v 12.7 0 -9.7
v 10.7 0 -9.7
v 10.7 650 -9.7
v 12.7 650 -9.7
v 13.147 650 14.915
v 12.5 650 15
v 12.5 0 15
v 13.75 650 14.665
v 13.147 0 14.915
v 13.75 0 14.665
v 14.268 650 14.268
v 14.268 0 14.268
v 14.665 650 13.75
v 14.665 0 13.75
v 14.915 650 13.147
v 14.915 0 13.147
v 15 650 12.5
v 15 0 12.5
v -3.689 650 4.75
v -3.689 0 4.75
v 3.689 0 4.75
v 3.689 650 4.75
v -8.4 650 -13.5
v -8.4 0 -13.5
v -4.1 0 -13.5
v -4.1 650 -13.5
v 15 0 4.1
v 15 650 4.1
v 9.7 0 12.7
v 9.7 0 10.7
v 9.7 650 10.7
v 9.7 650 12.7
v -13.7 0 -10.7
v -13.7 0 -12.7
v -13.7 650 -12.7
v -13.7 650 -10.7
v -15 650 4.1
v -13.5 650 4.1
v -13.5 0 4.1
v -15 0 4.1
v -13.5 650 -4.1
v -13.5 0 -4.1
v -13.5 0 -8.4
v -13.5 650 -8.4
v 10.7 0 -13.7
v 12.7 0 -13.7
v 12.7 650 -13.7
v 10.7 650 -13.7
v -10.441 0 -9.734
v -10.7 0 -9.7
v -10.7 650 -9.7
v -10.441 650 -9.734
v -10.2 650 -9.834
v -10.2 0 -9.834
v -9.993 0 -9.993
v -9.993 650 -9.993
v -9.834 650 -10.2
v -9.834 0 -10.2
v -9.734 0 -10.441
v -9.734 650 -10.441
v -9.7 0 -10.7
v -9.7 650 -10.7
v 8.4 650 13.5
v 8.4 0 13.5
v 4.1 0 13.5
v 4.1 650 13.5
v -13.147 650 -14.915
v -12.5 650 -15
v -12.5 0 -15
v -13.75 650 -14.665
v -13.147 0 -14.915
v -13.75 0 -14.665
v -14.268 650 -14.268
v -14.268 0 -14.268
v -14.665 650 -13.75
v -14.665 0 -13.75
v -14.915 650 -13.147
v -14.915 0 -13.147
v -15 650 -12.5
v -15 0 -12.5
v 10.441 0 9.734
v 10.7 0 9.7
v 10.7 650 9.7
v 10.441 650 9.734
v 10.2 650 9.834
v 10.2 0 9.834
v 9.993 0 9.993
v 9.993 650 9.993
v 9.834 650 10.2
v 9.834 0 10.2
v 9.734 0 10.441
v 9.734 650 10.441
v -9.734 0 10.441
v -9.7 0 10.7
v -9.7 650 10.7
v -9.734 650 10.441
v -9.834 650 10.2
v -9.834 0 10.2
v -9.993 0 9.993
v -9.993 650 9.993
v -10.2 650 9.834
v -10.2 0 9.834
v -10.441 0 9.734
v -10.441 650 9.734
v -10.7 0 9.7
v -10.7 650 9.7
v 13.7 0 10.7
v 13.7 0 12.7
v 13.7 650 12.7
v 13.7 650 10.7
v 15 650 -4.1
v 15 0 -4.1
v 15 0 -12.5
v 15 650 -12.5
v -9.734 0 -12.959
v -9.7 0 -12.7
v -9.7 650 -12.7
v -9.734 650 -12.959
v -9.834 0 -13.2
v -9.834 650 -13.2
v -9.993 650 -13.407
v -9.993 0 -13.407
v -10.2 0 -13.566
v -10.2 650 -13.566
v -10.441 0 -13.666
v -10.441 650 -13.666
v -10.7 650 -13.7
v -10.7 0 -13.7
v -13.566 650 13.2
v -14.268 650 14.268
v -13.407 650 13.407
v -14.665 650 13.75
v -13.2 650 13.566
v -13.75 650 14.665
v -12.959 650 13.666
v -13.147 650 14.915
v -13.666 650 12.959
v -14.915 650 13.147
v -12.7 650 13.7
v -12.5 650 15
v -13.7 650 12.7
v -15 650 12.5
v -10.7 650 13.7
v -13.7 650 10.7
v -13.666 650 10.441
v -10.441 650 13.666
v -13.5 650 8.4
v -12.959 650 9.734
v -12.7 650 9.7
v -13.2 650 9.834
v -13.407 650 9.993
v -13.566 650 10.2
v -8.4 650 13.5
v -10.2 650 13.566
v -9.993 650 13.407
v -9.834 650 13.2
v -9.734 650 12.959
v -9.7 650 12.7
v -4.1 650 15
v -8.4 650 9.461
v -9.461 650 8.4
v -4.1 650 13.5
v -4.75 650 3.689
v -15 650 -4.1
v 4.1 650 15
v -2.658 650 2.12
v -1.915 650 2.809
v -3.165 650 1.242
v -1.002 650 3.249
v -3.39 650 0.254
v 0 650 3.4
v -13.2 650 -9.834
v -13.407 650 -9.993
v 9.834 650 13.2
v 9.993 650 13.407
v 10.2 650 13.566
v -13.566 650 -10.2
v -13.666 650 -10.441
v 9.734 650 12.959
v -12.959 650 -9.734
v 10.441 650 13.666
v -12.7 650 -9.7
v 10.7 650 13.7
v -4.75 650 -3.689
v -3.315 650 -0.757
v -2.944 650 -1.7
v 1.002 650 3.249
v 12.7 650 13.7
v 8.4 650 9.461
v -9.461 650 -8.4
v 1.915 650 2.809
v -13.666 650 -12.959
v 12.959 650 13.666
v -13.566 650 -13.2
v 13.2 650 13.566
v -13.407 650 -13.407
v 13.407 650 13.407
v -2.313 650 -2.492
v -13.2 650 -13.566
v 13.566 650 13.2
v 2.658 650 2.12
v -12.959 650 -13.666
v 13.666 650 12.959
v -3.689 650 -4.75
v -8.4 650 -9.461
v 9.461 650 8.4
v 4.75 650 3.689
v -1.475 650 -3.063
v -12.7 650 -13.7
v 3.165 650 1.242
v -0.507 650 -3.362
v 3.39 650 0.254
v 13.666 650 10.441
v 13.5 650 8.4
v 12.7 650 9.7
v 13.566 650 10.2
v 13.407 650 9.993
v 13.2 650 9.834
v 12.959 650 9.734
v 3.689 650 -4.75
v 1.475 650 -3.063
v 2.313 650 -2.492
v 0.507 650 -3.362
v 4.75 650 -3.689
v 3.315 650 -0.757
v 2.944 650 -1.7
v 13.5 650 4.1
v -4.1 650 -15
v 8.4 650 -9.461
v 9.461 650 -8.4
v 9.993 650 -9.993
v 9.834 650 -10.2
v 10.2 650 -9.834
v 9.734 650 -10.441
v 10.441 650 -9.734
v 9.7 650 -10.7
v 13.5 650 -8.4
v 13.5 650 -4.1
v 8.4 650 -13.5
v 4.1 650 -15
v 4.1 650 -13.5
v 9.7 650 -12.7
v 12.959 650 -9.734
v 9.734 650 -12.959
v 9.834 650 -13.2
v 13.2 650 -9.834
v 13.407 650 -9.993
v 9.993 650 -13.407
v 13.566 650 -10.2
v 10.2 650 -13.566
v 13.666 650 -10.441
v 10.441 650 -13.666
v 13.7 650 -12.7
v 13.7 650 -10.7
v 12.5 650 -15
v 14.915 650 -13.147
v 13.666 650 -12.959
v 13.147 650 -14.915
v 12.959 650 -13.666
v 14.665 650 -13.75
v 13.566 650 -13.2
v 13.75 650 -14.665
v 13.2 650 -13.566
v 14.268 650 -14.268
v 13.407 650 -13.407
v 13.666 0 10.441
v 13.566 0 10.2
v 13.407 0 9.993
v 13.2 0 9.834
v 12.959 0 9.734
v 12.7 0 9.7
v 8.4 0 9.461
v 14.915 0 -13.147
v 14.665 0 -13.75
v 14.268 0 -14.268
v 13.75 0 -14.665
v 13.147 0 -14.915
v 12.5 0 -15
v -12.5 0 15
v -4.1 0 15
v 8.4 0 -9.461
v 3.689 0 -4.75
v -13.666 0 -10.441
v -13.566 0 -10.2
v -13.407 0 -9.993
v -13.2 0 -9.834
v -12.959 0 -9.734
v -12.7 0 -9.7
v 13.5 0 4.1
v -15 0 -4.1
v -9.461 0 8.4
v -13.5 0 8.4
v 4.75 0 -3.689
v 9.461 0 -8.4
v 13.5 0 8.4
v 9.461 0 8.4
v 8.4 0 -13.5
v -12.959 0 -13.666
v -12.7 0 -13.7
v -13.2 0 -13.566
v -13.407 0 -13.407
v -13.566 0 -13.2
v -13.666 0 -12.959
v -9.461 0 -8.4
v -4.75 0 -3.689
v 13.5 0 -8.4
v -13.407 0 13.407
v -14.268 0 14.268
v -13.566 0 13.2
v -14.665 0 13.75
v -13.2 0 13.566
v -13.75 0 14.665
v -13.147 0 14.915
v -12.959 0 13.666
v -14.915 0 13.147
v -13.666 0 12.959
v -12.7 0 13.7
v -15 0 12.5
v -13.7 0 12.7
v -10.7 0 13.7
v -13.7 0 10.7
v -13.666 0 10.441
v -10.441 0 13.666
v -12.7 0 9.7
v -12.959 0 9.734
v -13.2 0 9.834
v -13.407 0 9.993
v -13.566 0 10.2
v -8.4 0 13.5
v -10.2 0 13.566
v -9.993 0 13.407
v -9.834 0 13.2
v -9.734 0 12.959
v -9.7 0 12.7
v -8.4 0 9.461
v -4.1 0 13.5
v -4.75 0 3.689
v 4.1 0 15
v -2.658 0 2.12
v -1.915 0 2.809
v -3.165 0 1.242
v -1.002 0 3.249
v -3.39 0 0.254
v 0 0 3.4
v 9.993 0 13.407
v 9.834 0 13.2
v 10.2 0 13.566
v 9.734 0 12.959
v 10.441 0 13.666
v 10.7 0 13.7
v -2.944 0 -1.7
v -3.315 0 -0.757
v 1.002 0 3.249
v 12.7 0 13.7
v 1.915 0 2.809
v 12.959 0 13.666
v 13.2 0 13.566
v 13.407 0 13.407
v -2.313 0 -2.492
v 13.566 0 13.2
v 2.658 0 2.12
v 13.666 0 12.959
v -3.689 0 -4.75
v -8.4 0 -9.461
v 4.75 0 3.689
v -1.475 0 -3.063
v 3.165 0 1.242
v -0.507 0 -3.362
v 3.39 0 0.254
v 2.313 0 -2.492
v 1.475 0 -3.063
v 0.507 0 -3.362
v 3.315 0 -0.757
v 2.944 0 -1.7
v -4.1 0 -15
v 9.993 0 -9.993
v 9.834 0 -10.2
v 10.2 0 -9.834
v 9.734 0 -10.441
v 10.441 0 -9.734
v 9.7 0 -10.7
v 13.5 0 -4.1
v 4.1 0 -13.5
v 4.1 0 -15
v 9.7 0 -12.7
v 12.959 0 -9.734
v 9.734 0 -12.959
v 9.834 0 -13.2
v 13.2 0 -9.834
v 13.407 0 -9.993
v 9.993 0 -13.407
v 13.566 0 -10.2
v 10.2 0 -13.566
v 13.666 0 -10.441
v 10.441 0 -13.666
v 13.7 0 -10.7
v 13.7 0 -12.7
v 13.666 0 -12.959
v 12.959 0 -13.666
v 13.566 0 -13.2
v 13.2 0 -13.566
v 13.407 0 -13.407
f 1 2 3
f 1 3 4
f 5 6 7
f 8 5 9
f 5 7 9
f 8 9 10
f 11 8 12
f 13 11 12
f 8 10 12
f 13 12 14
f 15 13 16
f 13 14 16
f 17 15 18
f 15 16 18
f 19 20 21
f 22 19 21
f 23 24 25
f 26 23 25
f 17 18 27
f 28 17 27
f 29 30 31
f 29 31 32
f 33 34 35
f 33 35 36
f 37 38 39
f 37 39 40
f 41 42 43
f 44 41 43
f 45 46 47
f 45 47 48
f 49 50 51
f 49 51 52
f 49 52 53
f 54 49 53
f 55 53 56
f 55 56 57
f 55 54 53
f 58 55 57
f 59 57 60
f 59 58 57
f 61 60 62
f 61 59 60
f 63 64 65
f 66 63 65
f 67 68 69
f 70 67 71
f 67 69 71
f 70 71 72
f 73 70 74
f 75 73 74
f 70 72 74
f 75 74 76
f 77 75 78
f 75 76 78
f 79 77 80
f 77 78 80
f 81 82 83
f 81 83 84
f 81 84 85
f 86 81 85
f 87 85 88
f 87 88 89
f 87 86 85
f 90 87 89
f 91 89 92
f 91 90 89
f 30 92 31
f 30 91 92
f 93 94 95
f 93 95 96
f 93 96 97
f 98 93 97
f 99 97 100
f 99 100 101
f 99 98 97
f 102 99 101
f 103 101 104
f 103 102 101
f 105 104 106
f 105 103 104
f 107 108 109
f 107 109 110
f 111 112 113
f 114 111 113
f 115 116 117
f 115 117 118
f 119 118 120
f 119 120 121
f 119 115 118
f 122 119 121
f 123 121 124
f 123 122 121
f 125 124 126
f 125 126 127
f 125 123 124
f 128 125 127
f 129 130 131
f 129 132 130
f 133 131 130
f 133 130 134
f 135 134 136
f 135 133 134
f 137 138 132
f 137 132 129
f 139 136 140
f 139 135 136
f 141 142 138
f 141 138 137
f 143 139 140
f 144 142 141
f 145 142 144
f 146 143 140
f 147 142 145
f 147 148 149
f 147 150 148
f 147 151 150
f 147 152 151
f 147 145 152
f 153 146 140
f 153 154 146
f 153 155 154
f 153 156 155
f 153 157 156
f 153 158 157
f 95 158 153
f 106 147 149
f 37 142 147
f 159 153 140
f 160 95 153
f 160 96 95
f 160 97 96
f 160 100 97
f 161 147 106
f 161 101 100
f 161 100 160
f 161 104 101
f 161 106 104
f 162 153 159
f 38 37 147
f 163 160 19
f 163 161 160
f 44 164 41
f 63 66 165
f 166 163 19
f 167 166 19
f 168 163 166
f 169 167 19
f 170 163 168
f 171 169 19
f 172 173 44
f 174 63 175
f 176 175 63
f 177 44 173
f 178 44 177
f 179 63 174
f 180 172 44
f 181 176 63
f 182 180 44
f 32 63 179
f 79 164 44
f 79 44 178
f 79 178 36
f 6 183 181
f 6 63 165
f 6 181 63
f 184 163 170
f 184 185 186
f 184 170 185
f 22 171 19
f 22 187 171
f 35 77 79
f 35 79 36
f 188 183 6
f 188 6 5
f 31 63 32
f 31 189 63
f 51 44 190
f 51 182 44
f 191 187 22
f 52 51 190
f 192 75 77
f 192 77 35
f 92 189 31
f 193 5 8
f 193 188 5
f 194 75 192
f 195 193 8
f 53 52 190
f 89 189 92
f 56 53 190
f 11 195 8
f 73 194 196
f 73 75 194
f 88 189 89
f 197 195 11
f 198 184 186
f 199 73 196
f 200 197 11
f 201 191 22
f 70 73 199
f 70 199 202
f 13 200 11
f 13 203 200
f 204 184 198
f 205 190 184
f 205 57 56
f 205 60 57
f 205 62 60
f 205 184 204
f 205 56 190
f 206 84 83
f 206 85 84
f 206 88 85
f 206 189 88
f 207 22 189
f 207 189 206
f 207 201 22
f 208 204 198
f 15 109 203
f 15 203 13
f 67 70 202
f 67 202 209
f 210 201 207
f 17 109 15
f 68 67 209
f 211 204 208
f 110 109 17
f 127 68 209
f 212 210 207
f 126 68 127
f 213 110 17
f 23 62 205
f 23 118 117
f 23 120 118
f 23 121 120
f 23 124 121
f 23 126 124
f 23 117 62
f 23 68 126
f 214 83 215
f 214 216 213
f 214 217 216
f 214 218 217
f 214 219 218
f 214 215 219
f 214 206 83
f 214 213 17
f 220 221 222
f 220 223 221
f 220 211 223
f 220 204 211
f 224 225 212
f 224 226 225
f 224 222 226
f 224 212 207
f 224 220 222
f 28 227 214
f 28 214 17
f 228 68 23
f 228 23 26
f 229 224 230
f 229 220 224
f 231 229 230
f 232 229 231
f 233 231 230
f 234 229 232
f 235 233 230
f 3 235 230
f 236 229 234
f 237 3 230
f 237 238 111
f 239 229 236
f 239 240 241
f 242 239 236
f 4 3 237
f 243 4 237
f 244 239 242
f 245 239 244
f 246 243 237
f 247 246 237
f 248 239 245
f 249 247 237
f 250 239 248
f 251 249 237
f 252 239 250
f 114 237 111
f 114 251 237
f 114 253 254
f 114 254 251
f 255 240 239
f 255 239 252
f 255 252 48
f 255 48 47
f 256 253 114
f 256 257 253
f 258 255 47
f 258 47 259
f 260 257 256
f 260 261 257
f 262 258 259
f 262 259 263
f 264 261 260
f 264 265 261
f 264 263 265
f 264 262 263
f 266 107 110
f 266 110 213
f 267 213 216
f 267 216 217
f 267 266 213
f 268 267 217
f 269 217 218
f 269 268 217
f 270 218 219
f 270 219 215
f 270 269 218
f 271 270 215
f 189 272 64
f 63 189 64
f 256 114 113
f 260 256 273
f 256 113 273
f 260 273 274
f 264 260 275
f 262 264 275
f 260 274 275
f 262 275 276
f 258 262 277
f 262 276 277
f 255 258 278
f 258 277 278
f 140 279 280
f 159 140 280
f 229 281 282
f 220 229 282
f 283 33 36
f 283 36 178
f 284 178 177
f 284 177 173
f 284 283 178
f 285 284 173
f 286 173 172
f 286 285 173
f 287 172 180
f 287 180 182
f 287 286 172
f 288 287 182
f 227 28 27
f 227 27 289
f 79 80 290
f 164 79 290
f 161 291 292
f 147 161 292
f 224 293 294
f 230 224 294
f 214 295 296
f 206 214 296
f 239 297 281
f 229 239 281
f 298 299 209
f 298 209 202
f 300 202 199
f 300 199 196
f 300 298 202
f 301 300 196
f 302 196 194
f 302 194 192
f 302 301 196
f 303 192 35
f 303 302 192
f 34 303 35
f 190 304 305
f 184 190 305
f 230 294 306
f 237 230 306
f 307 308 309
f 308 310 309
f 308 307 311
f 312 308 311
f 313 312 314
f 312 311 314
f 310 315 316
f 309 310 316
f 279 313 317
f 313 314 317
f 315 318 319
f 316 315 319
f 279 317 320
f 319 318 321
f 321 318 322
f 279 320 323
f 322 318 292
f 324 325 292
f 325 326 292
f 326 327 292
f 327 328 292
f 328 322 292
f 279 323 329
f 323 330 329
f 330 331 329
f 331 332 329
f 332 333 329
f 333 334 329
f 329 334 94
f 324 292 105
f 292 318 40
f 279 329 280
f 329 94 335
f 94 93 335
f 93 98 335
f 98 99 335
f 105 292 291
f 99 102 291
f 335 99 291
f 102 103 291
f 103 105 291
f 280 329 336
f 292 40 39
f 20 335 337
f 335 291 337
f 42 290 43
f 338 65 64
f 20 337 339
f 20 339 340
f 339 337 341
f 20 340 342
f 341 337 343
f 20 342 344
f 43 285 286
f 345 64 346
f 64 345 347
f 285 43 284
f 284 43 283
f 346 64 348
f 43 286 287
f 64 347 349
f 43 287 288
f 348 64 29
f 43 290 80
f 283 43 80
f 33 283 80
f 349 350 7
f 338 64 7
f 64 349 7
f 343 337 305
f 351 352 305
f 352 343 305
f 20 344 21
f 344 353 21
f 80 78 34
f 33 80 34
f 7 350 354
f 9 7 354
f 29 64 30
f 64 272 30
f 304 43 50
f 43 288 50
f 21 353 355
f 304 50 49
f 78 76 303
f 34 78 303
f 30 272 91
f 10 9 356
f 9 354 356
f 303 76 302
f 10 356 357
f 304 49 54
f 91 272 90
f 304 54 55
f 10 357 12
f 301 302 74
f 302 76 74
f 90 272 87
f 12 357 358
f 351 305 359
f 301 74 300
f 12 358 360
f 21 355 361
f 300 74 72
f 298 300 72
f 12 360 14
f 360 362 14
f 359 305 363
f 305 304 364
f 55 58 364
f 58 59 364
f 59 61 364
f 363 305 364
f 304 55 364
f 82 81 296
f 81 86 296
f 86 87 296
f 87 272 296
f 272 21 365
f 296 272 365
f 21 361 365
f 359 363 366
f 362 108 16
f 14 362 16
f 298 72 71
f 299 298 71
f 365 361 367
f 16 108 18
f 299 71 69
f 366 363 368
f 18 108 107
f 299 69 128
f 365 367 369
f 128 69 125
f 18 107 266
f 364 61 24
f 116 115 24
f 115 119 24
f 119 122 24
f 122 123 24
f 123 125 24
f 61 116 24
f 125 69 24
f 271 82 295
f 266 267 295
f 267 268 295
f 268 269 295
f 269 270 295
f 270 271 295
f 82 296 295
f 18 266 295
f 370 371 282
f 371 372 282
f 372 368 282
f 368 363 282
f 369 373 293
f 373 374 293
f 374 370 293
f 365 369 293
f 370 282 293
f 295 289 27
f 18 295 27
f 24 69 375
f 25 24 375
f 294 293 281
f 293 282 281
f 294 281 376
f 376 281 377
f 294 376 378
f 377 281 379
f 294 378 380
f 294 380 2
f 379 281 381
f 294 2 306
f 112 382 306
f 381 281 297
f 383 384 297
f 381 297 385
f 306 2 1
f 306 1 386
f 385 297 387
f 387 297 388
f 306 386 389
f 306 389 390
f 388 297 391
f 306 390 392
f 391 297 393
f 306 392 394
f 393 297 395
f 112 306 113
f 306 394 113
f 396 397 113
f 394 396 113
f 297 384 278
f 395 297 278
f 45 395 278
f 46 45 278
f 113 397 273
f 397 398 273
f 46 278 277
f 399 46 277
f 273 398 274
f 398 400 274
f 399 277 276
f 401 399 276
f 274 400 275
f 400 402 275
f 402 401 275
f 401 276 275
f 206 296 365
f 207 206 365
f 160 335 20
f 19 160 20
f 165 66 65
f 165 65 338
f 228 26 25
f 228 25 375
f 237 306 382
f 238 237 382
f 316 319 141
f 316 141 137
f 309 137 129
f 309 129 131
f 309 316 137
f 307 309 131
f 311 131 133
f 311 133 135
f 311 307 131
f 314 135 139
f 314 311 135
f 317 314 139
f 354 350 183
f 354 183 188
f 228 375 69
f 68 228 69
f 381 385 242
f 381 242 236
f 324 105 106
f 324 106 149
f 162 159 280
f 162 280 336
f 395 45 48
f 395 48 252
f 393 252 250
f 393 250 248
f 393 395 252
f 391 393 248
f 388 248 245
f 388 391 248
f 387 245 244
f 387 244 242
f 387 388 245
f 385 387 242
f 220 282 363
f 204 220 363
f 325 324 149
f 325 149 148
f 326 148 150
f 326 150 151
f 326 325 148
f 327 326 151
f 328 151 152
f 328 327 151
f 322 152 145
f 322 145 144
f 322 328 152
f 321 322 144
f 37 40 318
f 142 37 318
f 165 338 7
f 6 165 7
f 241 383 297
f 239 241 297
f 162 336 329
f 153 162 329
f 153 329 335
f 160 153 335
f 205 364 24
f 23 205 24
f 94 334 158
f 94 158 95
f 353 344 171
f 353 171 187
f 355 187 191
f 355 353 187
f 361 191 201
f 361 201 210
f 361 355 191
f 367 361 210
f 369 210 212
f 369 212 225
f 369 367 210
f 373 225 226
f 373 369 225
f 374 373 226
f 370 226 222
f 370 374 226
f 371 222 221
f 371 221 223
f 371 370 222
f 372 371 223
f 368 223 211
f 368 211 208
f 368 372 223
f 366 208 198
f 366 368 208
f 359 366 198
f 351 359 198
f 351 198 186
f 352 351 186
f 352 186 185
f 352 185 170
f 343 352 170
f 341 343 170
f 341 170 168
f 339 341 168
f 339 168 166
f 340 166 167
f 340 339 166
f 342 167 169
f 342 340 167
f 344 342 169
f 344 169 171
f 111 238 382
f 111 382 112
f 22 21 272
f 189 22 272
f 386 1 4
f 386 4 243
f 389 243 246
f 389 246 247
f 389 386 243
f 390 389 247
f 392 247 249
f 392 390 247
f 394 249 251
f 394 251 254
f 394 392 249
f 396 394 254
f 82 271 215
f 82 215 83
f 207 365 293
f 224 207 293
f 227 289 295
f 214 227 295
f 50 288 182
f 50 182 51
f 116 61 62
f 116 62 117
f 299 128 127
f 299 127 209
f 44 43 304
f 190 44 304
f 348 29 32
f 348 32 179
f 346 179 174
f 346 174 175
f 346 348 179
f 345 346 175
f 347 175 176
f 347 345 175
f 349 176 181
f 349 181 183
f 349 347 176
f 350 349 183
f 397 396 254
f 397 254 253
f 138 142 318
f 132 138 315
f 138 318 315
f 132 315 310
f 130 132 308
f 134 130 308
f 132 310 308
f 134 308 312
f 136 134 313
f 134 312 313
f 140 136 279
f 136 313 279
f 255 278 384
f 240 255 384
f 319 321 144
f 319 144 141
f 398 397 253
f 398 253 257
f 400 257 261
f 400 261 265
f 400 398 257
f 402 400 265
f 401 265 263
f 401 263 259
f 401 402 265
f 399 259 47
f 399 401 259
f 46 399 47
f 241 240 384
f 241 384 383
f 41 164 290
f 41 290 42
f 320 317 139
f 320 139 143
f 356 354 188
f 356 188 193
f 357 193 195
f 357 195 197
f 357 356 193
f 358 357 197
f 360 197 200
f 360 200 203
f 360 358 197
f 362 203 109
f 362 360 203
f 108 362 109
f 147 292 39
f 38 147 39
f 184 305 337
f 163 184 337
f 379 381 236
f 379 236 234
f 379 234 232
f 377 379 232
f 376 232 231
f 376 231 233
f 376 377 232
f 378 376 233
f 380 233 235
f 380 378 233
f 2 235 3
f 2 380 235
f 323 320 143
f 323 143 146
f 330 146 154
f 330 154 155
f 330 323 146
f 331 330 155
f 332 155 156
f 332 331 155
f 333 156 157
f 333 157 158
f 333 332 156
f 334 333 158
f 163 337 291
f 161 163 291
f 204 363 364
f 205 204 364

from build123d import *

# Parameters (mm, degrees)
SKETCH_1_R      = 3.4
EXTRUDE_1_DEPTH = 650


with BuildPart() as part:
    # 草图1 → 凸台-拉伸1 (new body)
    with BuildSketch(Plane(origin=(0, 0, 0), x_dir=(1, 0, 0), z_dir=(0, 1, 0))):
        with BuildLine():
            Line((-4.1, 15), (-12.5, 15))
            ThreePointArc((-12.5, 15), (-14.267766953, 14.267766953), (-15, 12.5))
            Line((-15, 12.5), (-15, 4.1))
            Line((-15, 4.1), (-13.5, 4.1))
            Line((-13.5, 4.1), (-13.5, 8.4))
            Line((-13.5, 8.4), (-9.460660172, 8.4))
            Line((-9.460660172, 8.4), (-4.75, 3.689339828))
            Line((-4.75, 3.689339828), (-4.75, -3.689339828))
            Line((-4.75, -3.689339828), (-9.460660172, -8.4))
            Line((-9.460660172, -8.4), (-13.5, -8.4))
            Line((-13.5, -8.4), (-13.5, -4.1))
            Line((-13.5, -4.1), (-15, -4.1))
            Line((-15, -4.1), (-15, -12.5))
            ThreePointArc((-15, -12.5), (-14.267766953, -14.267766953), (-12.5, -15))
            Line((-12.5, -15), (-4.1, -15))
            Line((-4.1, -15), (-4.1, -13.5))
            Line((-4.1, -13.5), (-8.4, -13.5))
            Line((-8.4, -13.5), (-8.4, -9.460660172))
            Line((-8.4, -9.460660172), (-3.689339828, -4.75))
            Line((-3.689339828, -4.75), (3.689339828, -4.75))
            Line((3.689339828, -4.75), (8.4, -9.460660172))
            Line((8.4, -9.460660172), (8.4, -13.5))
            Line((8.4, -13.5), (4.1, -13.5))
            Line((4.1, -13.5), (4.1, -15))
            Line((4.1, -15), (12.5, -15))
            ThreePointArc((12.5, -15), (14.267766953, -14.267766953), (15, -12.5))
            Line((15, -12.5), (15, -4.1))
            Line((15, -4.1), (13.5, -4.1))
            Line((13.5, -4.1), (13.5, -8.4))
            Line((13.5, -8.4), (9.460660172, -8.4))
            Line((9.460660172, -8.4), (4.75, -3.689339828))
            Line((4.75, -3.689339828), (4.75, 3.689339828))
            Line((4.75, 3.689339828), (9.460660172, 8.4))
            Line((9.460660172, 8.4), (13.5, 8.4))
            Line((13.5, 8.4), (13.5, 4.1))
            Line((13.5, 4.1), (15, 4.1))
            Line((15, 4.1), (15, 12.5))
            ThreePointArc((15, 12.5), (14.267766953, 14.267766953), (12.5, 15))
            Line((12.5, 15), (4.1, 15))
            Line((4.1, 15), (4.1, 13.5))
            Line((4.1, 13.5), (8.4, 13.5))
            Line((8.4, 13.5), (8.4, 9.460660172))
            Line((8.4, 9.460660172), (3.689339828, 4.75))
            Line((3.689339828, 4.75), (-3.689339828, 4.75))
            Line((-3.689339828, 4.75), (-8.4, 9.460660172))
            Line((-8.4, 9.460660172), (-8.4, 13.5))
            Line((-8.4, 13.5), (-4.1, 13.5))
            Line((-4.1, 13.5), (-4.1, 15))
        make_face()
        with Locations(Location((0, 0, 0), (0, 0, 270))):
            Circle(SKETCH_1_R, mode=Mode.SUBTRACT)
        with BuildLine():
            Line((-10.7, 13.7), (-12.7, 13.7))
            ThreePointArc((-12.7, 13.7), (-13.407106781, 13.407106781), (-13.7, 12.7))
            Line((-13.7, 12.7), (-13.7, 10.7))
            ThreePointArc((-13.7, 10.7), (-13.407106781, 9.992893219), (-12.7, 9.7))
            Line((-12.7, 9.7), (-10.7, 9.7))
            ThreePointArc((-10.7, 9.7), (-9.992893219, 9.992893219), (-9.7, 10.7))
            Line((-9.7, 10.7), (-9.7, 12.7))
            ThreePointArc((-9.7, 12.7), (-9.992893219, 13.407106781), (-10.7, 13.7))
        make_face(mode=Mode.SUBTRACT)
        with BuildLine():
            Line((13.7, 10.7), (13.7, 12.7))
            ThreePointArc((13.7, 12.7), (13.407106781, 13.407106781), (12.7, 13.7))
            Line((12.7, 13.7), (10.7, 13.7))
            ThreePointArc((10.7, 13.7), (9.992893219, 13.407106781), (9.7, 12.7))
            Line((9.7, 12.7), (9.7, 10.7))
            ThreePointArc((9.7, 10.7), (9.992893219, 9.992893219), (10.7, 9.7))
            Line((10.7, 9.7), (12.7, 9.7))
            ThreePointArc((12.7, 9.7), (13.407106781, 9.992893219), (13.7, 10.7))
        make_face(mode=Mode.SUBTRACT)
        with BuildLine():
            Line((10.7, -13.7), (12.7, -13.7))
            ThreePointArc((12.7, -13.7), (13.407106781, -13.407106781), (13.7, -12.7))
            Line((13.7, -12.7), (13.7, -10.7))
            ThreePointArc((13.7, -10.7), (13.407106781, -9.992893219), (12.7, -9.7))
            Line((12.7, -9.7), (10.7, -9.7))
            ThreePointArc((10.7, -9.7), (9.992893219, -9.992893219), (9.7, -10.7))
            Line((9.7, -10.7), (9.7, -12.7))
            ThreePointArc((9.7, -12.7), (9.992893219, -13.407106781), (10.7, -13.7))
        make_face(mode=Mode.SUBTRACT)
        with BuildLine():
            Line((-13.7, -10.7), (-13.7, -12.7))
            ThreePointArc((-13.7, -12.7), (-13.407106781, -13.407106781), (-12.7, -13.7))
            Line((-12.7, -13.7), (-10.7, -13.7))
            ThreePointArc((-10.7, -13.7), (-9.992893219, -13.407106781), (-9.7, -12.7))
            Line((-9.7, -12.7), (-9.7, -10.7))
            ThreePointArc((-9.7, -10.7), (-9.992893219, -9.992893219), (-10.7, -9.7))
            Line((-10.7, -9.7), (-12.7, -9.7))
            ThreePointArc((-12.7, -9.7), (-13.407106781, -9.992893219), (-13.7, -10.7))
        make_face(mode=Mode.SUBTRACT)
    extrude(amount=EXTRUDE_1_DEPTH)


solid = part.part
